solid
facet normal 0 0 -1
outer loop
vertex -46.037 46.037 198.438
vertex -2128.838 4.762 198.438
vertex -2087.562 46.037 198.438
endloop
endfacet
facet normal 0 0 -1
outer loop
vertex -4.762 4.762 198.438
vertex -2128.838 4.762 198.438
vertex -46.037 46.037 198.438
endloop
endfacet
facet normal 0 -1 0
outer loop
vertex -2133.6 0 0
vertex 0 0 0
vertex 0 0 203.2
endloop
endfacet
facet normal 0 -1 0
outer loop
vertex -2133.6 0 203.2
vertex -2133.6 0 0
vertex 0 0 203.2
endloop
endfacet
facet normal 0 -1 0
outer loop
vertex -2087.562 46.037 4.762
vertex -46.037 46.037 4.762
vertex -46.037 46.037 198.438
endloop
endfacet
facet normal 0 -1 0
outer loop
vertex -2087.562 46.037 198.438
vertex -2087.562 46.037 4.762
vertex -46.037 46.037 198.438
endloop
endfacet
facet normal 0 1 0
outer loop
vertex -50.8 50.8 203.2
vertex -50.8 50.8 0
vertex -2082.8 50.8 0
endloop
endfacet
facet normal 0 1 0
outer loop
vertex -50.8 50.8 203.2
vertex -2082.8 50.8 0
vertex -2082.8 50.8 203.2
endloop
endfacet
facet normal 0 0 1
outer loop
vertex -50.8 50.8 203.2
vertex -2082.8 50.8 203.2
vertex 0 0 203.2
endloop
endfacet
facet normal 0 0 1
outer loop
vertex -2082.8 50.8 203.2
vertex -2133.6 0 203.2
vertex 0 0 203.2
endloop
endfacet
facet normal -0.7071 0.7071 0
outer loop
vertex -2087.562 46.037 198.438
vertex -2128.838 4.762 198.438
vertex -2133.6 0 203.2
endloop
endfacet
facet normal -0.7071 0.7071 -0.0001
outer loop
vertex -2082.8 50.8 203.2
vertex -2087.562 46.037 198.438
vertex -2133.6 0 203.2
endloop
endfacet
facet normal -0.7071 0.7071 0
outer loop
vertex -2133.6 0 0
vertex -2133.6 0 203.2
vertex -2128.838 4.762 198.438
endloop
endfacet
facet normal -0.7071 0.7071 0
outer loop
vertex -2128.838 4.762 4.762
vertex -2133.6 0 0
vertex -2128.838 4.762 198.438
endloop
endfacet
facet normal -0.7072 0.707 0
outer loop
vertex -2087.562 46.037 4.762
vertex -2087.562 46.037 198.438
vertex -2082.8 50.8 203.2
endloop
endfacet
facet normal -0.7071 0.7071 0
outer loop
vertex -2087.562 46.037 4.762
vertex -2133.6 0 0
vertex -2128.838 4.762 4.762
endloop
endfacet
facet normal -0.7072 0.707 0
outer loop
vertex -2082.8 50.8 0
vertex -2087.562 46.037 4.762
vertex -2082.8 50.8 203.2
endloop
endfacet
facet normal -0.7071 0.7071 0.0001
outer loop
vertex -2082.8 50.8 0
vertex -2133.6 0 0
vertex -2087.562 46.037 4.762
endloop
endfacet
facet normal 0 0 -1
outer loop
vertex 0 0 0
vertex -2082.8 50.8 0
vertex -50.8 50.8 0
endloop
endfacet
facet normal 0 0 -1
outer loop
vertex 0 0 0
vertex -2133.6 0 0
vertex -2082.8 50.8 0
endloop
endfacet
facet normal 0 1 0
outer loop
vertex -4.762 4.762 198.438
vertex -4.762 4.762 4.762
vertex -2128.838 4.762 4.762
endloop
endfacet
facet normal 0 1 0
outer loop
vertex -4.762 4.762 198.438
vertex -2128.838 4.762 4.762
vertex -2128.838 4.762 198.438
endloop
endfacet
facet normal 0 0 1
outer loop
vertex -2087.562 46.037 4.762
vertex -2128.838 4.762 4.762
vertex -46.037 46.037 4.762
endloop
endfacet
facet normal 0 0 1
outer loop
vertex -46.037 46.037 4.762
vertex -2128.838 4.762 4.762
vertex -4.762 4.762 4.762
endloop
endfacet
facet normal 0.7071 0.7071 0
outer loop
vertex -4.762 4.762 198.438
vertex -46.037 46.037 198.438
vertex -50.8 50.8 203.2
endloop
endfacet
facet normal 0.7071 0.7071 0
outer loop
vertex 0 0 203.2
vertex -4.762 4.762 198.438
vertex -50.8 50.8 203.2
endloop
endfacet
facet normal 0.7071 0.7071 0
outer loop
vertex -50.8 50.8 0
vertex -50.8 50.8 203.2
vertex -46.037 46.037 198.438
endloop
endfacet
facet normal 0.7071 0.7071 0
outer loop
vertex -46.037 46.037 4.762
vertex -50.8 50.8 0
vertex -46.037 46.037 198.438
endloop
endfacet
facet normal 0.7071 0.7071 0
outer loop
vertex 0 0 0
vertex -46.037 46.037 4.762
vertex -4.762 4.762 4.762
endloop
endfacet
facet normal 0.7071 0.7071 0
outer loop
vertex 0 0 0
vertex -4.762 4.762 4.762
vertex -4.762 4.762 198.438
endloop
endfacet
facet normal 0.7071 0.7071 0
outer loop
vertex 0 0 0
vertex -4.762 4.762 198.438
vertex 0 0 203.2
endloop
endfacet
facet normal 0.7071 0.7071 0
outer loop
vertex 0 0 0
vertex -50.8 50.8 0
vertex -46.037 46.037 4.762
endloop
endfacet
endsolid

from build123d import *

# Parameters (mm, degrees)
F0_W        = 50.8
F0_H        = 203.2
F0_W_2      = 41.275
F0_H_2      = 193.675
F1_DEPTH    = 2133.6
F2_T1_DEPTH = 464.4829915773
F3_T1_DEPTH = 464.4829915773


# Not quite as in the source:
# - a fillet or chamfer that OpenCascade refuses, or shapes differently, is made with other operations: its cross-section is extruded or revolved along the edge and cut away or added


with BuildPart() as f1:
    # F0 (on Right) → F1 (new body)
    with BuildSketch(Plane.YZ):
        with Locations((25.4, 101.6)):
            Rectangle(F0_W, F0_H)
        with Locations((25.4, 101.6)):
            Rectangle(F0_W_2, F0_H_2, mode=Mode.SUBTRACT)
    extrude(amount=-F1_DEPTH)

    # F2: chamfer of 50.8 on 1 edges, made by hand

    # F2_s2 → F2_t1 (cut)
    with BuildSketch(Plane.XY.offset(-130.6414957887)):
        Polygon((-50.8, 50.8), (0, 0), (0, 50.8), align=None)
    extrude(amount=F2_T1_DEPTH, mode=Mode.SUBTRACT)

    # F3: chamfer of 50.8 on 1 edges, made by hand

    # F3_s2 → F3_t1 (cut)
    with BuildSketch(Plane.XY.offset(-130.6414957887)):
        Polygon((-2133.6, 0), (-2082.8, 50.8), (-2133.6, 50.8), align=None)
    extrude(amount=F3_T1_DEPTH, mode=Mode.SUBTRACT)


solid = f1.part
